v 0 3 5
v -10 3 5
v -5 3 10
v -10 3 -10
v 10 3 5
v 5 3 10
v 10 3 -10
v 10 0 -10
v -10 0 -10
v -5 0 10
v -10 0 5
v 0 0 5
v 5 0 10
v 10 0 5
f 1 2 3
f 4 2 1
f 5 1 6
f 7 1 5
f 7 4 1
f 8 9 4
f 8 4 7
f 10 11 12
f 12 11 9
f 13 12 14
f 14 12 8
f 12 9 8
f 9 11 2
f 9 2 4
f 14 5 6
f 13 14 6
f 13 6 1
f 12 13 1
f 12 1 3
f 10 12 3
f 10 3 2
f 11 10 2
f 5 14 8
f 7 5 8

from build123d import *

# Parameters (mm, degrees)
SKETCH1_W               = 20
SKETCH1_H               = 20
BOSS_EXTRUDE1_DEPTH     = 3
CUT_EXTRUDE1_DEPTH      = 1
CUT_EXTRUDE1_DEPTH_BACK = 4


with BuildPart() as part:
    # Sketch1 → Boss-Extrude1 (new body)
    with BuildSketch(Plane(origin=(0, 0, 0), x_dir=(1, 0, 0), z_dir=(0, 1, 0))):
        Rectangle(SKETCH1_W, SKETCH1_H)
    extrude(amount=BOSS_EXTRUDE1_DEPTH)

    # Sketch2 → Cut-Extrude1 (cut, two sides)
    with BuildSketch(Plane(origin=(0, 3, 0), x_dir=(1, 0, 0), z_dir=(0, 1, 0))) as cut_extrude1_sk:
        Polygon((-5, -10), (-10, -5), (-10, -10), align=None)
        Polygon((0, -5), (-5, -10), (5, -10), align=None)
        Polygon((10, -5), (5, -10), (10, -10), align=None)
    extrude(amount=CUT_EXTRUDE1_DEPTH, mode=Mode.SUBTRACT)
    extrude(cut_extrude1_sk.sketch, amount=-CUT_EXTRUDE1_DEPTH_BACK, mode=Mode.SUBTRACT)


solid = part.part
